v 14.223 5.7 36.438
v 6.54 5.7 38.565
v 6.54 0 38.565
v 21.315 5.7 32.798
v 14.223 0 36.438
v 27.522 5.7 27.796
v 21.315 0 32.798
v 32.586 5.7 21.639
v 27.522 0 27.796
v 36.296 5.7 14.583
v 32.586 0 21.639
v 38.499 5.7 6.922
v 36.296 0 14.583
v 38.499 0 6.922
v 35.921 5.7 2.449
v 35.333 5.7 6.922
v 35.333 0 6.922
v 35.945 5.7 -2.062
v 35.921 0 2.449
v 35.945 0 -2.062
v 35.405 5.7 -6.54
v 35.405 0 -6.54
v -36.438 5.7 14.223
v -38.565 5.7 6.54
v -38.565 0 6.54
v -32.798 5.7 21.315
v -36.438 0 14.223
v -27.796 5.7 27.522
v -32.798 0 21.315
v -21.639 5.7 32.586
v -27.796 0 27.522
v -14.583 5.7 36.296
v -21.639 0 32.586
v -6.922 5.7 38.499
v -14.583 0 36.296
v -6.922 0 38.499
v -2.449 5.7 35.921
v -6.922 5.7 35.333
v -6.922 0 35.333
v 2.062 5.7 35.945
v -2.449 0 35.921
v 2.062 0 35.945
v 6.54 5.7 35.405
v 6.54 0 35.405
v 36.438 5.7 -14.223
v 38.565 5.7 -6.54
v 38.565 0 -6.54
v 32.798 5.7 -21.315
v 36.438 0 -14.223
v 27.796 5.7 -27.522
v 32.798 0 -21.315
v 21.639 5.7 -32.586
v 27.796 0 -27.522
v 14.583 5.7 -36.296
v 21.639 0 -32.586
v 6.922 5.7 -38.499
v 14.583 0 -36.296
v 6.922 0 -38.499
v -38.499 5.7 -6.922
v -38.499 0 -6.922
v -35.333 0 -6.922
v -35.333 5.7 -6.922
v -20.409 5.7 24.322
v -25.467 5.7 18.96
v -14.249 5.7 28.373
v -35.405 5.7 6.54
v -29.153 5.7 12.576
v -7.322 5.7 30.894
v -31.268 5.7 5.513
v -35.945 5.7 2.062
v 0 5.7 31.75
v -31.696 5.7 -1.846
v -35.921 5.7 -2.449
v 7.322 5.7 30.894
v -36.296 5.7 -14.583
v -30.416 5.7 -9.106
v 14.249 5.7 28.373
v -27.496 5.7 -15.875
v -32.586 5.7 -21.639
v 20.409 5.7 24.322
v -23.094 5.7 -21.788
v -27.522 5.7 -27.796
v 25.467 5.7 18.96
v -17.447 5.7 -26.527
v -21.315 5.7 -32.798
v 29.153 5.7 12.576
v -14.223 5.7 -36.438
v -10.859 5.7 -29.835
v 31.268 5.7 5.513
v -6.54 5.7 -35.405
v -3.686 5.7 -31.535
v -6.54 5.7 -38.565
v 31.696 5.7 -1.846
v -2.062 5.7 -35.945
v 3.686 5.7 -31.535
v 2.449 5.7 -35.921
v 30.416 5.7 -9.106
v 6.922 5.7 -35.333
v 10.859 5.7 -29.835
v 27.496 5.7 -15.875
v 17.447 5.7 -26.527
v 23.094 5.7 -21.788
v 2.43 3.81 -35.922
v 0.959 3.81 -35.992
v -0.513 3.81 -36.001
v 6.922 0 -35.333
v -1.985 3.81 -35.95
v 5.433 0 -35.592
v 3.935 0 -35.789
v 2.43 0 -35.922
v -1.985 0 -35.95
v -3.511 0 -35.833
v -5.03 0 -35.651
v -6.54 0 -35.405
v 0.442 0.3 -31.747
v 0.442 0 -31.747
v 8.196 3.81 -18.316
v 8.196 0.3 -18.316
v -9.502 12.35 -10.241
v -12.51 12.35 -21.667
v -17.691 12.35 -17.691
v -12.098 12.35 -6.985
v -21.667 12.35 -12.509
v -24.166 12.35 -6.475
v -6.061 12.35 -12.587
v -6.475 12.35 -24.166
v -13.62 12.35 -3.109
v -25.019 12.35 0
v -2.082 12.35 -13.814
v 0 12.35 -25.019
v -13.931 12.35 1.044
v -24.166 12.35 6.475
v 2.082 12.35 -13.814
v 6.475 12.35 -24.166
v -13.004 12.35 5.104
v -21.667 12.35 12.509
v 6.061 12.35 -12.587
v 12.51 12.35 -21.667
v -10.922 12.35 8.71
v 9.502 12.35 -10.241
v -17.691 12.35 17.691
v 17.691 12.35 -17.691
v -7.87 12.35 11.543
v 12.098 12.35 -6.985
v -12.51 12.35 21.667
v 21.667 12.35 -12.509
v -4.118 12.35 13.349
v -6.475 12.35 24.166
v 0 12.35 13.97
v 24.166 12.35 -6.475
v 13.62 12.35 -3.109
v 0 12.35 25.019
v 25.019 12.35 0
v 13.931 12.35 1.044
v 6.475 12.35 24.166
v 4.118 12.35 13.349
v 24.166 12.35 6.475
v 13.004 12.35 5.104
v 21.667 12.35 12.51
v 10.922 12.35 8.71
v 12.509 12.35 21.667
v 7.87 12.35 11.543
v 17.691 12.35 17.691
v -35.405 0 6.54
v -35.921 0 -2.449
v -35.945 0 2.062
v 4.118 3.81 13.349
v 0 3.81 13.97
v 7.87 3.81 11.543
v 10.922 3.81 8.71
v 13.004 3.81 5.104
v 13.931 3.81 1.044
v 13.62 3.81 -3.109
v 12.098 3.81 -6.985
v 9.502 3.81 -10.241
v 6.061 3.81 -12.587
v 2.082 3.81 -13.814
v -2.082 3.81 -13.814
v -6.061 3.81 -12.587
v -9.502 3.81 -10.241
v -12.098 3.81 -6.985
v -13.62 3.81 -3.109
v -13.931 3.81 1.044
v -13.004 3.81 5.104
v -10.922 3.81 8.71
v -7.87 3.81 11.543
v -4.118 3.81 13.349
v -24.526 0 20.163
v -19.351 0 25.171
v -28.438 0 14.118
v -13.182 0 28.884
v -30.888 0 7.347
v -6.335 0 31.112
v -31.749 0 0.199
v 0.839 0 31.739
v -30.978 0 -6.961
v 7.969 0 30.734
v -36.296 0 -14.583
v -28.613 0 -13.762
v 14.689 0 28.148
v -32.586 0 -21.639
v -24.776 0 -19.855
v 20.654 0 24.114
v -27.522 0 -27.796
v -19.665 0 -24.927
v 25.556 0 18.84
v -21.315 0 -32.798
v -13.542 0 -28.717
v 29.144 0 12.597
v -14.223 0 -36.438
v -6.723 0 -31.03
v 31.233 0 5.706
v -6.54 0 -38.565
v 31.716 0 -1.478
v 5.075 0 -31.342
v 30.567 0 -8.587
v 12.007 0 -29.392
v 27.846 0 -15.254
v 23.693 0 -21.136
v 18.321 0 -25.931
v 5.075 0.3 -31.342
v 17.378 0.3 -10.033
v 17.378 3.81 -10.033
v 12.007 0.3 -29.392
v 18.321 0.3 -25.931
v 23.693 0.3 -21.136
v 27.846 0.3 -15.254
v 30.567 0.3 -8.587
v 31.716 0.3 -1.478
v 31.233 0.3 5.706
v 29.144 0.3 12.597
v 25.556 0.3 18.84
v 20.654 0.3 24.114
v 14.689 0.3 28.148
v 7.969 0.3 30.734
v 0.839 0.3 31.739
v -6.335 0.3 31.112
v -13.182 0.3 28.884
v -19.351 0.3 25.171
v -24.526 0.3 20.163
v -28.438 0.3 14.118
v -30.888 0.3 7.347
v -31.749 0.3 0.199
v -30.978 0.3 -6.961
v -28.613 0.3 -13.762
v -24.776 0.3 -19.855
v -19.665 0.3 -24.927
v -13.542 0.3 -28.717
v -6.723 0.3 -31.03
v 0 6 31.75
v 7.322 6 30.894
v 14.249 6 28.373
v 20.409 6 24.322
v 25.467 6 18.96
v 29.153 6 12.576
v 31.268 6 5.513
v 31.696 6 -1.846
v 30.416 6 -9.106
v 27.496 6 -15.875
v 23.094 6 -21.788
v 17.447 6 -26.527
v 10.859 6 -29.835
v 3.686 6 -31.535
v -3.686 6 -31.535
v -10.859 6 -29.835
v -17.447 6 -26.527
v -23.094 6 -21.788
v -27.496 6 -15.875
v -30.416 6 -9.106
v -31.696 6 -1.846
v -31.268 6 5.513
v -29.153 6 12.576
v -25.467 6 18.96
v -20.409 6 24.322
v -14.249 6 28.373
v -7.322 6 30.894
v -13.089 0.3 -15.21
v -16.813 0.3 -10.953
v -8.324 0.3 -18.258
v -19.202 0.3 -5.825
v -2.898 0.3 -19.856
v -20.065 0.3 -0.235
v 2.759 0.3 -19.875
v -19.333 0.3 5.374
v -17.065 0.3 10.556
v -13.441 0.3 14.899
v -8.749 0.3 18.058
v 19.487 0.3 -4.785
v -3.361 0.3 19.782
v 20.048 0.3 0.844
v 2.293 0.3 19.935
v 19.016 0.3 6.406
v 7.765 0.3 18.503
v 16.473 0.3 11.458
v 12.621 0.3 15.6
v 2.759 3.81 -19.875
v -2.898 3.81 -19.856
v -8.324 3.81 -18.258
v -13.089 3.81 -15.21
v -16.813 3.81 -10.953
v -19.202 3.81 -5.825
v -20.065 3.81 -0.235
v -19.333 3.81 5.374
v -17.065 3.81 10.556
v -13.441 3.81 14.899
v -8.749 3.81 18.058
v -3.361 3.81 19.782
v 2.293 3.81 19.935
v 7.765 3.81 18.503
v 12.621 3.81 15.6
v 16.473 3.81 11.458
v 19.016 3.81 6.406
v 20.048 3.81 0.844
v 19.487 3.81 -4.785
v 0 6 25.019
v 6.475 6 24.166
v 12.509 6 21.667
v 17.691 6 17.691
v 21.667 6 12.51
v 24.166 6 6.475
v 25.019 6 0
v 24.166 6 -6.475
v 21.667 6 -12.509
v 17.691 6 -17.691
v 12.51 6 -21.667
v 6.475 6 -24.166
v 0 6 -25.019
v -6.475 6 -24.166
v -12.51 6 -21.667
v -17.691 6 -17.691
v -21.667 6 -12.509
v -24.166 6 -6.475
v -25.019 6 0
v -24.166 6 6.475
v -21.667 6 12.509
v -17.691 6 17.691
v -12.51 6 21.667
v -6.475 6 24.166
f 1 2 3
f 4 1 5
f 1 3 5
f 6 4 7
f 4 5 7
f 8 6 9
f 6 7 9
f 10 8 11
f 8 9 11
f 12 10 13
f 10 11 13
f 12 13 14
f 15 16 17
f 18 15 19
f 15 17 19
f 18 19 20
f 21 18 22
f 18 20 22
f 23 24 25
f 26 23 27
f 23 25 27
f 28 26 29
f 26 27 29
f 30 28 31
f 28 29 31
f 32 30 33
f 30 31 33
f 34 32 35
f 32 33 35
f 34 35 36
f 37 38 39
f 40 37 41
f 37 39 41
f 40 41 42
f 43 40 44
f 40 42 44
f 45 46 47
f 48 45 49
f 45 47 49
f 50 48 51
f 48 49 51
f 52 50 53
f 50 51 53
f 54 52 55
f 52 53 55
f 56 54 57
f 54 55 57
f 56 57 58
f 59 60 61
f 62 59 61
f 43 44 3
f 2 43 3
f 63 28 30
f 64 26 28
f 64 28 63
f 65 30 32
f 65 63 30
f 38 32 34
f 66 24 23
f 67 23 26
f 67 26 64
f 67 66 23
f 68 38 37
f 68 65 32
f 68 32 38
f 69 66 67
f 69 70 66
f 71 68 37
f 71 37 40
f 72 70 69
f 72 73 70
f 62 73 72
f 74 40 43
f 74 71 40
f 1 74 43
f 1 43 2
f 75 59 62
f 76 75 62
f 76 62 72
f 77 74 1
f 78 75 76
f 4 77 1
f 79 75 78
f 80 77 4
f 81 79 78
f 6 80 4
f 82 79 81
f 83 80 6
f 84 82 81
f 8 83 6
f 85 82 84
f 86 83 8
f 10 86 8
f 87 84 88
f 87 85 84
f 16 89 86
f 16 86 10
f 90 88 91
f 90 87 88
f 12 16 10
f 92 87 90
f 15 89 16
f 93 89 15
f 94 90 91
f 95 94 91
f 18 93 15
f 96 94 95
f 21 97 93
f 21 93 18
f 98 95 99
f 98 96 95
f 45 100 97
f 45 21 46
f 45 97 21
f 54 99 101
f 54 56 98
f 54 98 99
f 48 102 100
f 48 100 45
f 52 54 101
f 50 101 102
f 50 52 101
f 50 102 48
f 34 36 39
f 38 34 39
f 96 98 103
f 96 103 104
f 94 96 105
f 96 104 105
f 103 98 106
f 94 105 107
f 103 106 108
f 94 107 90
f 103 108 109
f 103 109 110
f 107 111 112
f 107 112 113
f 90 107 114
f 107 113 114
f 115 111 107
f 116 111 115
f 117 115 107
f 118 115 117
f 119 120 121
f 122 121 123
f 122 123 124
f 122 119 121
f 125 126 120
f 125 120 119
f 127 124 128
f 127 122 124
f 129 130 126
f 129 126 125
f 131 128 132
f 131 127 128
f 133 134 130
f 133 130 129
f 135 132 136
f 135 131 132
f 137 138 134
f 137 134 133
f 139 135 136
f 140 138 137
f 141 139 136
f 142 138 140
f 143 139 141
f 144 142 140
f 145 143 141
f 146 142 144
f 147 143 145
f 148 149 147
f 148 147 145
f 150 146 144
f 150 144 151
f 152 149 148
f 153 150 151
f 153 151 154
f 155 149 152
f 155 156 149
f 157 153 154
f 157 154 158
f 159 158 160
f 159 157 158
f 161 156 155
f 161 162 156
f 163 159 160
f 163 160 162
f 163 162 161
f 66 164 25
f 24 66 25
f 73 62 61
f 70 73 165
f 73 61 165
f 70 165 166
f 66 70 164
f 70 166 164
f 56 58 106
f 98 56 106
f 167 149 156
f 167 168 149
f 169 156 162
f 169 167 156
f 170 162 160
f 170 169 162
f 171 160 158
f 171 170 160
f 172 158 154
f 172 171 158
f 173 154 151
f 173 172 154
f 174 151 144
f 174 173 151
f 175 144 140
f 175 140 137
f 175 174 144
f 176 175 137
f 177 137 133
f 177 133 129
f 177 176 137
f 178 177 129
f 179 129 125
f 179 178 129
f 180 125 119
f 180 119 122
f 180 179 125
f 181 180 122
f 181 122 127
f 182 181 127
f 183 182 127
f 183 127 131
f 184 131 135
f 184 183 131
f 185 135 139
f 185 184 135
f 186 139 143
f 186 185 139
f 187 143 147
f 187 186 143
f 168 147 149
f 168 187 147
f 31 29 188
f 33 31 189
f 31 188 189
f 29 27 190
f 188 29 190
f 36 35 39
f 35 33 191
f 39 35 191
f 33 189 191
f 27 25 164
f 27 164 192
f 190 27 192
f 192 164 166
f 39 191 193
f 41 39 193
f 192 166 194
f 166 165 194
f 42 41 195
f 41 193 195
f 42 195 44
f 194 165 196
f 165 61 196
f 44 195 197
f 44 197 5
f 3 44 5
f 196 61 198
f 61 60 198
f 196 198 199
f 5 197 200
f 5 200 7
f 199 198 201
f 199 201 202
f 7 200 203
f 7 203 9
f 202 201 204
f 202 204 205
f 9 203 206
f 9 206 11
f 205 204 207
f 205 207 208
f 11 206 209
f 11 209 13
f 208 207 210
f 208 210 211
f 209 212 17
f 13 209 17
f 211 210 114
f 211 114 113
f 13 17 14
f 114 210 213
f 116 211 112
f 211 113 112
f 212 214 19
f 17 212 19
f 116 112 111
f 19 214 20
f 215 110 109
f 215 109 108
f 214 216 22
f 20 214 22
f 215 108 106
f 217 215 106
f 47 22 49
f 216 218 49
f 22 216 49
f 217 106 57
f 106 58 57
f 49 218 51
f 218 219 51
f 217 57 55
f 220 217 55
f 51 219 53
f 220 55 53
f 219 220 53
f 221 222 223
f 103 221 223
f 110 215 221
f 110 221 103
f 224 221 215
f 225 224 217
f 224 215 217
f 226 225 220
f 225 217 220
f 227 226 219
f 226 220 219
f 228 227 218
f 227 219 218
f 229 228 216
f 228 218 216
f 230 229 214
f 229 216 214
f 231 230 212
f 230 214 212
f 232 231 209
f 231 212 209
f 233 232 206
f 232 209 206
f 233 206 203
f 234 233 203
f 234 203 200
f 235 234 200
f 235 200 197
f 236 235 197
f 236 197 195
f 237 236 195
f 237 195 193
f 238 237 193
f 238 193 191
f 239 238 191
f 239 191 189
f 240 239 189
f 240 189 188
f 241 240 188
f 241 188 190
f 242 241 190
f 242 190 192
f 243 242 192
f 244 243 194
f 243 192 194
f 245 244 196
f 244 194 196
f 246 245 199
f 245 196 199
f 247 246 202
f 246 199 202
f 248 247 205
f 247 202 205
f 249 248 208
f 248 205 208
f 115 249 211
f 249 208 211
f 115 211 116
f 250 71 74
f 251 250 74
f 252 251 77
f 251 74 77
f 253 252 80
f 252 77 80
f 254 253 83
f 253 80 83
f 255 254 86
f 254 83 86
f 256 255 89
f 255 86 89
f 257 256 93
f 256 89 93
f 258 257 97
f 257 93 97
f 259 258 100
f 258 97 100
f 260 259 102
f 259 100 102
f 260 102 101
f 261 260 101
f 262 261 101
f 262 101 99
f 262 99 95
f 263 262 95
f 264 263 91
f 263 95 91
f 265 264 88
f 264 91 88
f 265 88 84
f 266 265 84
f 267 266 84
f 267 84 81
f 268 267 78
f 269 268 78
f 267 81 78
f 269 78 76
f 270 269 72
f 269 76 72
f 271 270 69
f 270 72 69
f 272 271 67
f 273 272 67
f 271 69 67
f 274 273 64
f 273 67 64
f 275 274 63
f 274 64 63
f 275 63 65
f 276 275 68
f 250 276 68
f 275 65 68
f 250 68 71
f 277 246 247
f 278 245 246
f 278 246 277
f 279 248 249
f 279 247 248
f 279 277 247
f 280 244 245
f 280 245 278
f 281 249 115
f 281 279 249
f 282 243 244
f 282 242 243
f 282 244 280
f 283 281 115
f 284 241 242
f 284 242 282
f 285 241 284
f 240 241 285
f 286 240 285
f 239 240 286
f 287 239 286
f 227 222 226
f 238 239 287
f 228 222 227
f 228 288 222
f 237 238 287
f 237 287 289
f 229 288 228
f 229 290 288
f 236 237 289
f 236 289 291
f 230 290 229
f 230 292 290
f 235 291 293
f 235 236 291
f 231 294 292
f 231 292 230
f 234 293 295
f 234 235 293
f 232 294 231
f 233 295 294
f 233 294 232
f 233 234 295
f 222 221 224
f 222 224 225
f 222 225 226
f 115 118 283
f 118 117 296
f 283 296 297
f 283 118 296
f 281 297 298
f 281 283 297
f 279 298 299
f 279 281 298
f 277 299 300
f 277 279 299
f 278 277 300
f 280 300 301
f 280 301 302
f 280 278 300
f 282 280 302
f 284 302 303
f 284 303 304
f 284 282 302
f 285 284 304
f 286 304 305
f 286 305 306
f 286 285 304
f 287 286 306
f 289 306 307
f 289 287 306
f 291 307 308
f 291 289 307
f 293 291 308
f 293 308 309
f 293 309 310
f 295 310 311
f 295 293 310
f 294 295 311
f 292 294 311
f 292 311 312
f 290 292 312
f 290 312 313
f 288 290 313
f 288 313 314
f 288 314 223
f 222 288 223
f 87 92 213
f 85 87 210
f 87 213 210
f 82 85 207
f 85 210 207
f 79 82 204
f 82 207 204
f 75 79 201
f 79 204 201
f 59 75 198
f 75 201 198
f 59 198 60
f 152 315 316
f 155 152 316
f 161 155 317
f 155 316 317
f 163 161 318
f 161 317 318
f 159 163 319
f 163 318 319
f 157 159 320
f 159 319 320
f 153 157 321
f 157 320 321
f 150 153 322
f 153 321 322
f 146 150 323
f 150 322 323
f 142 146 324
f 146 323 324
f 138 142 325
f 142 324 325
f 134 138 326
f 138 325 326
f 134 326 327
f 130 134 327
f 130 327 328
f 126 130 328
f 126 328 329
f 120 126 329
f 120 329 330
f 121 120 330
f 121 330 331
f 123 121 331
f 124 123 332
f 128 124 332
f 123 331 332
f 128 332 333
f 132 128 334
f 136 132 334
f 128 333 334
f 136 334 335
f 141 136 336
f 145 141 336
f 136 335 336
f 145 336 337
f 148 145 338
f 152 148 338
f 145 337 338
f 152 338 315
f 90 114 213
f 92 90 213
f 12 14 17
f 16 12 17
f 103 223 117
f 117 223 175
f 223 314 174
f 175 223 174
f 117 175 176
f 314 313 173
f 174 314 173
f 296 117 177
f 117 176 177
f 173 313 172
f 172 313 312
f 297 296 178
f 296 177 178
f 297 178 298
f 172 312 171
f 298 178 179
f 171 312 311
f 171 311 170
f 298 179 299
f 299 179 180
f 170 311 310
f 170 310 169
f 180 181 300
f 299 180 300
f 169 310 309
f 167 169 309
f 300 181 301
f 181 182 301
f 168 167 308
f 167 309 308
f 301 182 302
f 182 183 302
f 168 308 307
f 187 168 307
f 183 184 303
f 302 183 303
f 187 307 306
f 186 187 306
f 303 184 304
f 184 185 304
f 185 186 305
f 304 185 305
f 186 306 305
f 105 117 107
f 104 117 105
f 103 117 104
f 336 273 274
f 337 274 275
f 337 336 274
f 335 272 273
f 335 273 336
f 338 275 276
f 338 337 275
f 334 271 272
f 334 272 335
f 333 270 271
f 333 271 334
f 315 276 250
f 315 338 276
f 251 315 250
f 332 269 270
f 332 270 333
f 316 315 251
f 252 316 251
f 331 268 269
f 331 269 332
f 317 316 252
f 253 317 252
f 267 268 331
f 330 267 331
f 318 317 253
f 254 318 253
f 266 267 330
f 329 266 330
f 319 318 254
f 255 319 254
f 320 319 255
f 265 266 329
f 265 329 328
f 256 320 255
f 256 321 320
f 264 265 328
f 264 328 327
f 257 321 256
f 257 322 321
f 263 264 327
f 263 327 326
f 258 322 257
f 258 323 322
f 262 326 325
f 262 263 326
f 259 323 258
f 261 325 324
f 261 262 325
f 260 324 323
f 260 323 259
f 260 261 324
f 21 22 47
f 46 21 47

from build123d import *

# Parameters (mm, degrees)
SKETCH1_R           = 13.97
BOSS_EXTRUDE2_DEPTH = 6.0000007
CUT_EXTRUDE1_DEPTH  = 3.81
SKETCH3_R           = 31.75
CUT_EXTRUDE2_DEPTH  = 0.3
SKETCH5_R           = 25.019
SKETCH5_R_2         = 13.97
BOSS_EXTRUDE3_DEPTH = 6.35
CUT_EXTRUDE3_START  = -0.3
SKETCH6_R           = 50.8
SKETCH6_R_2         = 31.75
CUT_EXTRUDE3_DEPTH  = 0.3


with BuildPart() as part:
    # Sketch1 → Boss-Extrude2 (new body)
    with BuildSketch(Plane(origin=(0, 0, 0), x_dir=(1, 0, 0), z_dir=(0, 1, 0))):
        with BuildLine():
            Line((35.405449863, 6.5405), (38.565312338, 6.5405))
            ThreePointArc((38.565312338, 6.5405), (27.795594479, 27.522107178), (6.9215, 38.498757042))
            Line((6.9215, 38.498757042), (6.9215, 35.332942957))
            ThreePointArc((6.9215, 35.332942957), (0.19391896, 36.003977776), (-6.5405, 35.405449863))
            Line((-6.5405, 35.405449863), (-6.5405, 38.565312338))
            ThreePointArc((-6.5405, 38.565312338), (-27.522107178, 27.795594479), (-38.498757042, 6.9215))
            Line((-38.498757042, 6.9215), (-35.332942957, 6.9215))
            ThreePointArc((-35.332942957, 6.9215), (-36.003977776, 0.19391896), (-35.405449863, -6.5405))
            Line((-35.405449863, -6.5405), (-38.565312338, -6.5405))
            ThreePointArc((-38.565312338, -6.5405), (-27.795594479, -27.522107178), (-6.9215, -38.498757042))
            Line((-6.9215, -38.498757042), (-6.9215, -35.332942957))
            ThreePointArc((-6.9215, -35.332942957), (-0.19391896, -36.003977776), (6.5405, -35.405449863))
            Line((6.5405, -35.405449863), (6.5405, -38.565312338))
            ThreePointArc((6.5405, -38.565312338), (27.522107178, -27.795594479), (38.498757042, -6.9215))
            Line((38.498757042, -6.9215), (35.332942957, -6.9215))
            ThreePointArc((35.332942957, -6.9215), (36.003977776, -0.19391896), (35.405449863, 6.5405))
        make_face()
        Circle(SKETCH1_R, mode=Mode.SUBTRACT)
    extrude(amount=BOSS_EXTRUDE2_DEPTH)

    # Sketch2 → Cut-Extrude1 (cut)
    with BuildSketch(Plane.XZ):
        with BuildLine():
            Line((17.377665752, -10.033), (-0.286554615, -40.628327152))
            ThreePointArc((-0.286554615, -40.628327152), (-2.416432138, -40.557415308), (-4.539661745, -40.374924792))
            Line((-4.539661745, -40.374924792), (8.196212586, -18.315743371))
            ThreePointArc((8.196212586, -18.315743371), (-13.440862054, 14.899247741), (17.377665752, -10.033))
        make_face()
    extrude(amount=-CUT_EXTRUDE1_DEPTH, mode=Mode.SUBTRACT)

    # Sketch3 → Cut-Extrude2 (cut)
    with BuildSketch(Plane.XZ):
        Circle(SKETCH3_R)
    extrude(amount=-CUT_EXTRUDE2_DEPTH, mode=Mode.SUBTRACT)

    # Sketch5 → Boss-Extrude3 (add)
    with BuildSketch(Plane(origin=(0, 6.0000007, 0), x_dir=(1, 0, 0), z_dir=(0, 1, 0))):
        Circle(SKETCH5_R)
        Circle(SKETCH5_R_2, mode=Mode.SUBTRACT)
    extrude(amount=BOSS_EXTRUDE3_DEPTH)

    # Sketch6 → Cut-Extrude3 (cut)
    with BuildSketch(Plane(origin=(0, 6.0000007, 0), x_dir=(1, 0, 0), z_dir=(0, 1, 0)).offset(CUT_EXTRUDE3_START)):
        Circle(SKETCH6_R)
        Circle(SKETCH6_R_2, mode=Mode.SUBTRACT)
    extrude(amount=CUT_EXTRUDE3_DEPTH, mode=Mode.SUBTRACT)


solid = part.part
